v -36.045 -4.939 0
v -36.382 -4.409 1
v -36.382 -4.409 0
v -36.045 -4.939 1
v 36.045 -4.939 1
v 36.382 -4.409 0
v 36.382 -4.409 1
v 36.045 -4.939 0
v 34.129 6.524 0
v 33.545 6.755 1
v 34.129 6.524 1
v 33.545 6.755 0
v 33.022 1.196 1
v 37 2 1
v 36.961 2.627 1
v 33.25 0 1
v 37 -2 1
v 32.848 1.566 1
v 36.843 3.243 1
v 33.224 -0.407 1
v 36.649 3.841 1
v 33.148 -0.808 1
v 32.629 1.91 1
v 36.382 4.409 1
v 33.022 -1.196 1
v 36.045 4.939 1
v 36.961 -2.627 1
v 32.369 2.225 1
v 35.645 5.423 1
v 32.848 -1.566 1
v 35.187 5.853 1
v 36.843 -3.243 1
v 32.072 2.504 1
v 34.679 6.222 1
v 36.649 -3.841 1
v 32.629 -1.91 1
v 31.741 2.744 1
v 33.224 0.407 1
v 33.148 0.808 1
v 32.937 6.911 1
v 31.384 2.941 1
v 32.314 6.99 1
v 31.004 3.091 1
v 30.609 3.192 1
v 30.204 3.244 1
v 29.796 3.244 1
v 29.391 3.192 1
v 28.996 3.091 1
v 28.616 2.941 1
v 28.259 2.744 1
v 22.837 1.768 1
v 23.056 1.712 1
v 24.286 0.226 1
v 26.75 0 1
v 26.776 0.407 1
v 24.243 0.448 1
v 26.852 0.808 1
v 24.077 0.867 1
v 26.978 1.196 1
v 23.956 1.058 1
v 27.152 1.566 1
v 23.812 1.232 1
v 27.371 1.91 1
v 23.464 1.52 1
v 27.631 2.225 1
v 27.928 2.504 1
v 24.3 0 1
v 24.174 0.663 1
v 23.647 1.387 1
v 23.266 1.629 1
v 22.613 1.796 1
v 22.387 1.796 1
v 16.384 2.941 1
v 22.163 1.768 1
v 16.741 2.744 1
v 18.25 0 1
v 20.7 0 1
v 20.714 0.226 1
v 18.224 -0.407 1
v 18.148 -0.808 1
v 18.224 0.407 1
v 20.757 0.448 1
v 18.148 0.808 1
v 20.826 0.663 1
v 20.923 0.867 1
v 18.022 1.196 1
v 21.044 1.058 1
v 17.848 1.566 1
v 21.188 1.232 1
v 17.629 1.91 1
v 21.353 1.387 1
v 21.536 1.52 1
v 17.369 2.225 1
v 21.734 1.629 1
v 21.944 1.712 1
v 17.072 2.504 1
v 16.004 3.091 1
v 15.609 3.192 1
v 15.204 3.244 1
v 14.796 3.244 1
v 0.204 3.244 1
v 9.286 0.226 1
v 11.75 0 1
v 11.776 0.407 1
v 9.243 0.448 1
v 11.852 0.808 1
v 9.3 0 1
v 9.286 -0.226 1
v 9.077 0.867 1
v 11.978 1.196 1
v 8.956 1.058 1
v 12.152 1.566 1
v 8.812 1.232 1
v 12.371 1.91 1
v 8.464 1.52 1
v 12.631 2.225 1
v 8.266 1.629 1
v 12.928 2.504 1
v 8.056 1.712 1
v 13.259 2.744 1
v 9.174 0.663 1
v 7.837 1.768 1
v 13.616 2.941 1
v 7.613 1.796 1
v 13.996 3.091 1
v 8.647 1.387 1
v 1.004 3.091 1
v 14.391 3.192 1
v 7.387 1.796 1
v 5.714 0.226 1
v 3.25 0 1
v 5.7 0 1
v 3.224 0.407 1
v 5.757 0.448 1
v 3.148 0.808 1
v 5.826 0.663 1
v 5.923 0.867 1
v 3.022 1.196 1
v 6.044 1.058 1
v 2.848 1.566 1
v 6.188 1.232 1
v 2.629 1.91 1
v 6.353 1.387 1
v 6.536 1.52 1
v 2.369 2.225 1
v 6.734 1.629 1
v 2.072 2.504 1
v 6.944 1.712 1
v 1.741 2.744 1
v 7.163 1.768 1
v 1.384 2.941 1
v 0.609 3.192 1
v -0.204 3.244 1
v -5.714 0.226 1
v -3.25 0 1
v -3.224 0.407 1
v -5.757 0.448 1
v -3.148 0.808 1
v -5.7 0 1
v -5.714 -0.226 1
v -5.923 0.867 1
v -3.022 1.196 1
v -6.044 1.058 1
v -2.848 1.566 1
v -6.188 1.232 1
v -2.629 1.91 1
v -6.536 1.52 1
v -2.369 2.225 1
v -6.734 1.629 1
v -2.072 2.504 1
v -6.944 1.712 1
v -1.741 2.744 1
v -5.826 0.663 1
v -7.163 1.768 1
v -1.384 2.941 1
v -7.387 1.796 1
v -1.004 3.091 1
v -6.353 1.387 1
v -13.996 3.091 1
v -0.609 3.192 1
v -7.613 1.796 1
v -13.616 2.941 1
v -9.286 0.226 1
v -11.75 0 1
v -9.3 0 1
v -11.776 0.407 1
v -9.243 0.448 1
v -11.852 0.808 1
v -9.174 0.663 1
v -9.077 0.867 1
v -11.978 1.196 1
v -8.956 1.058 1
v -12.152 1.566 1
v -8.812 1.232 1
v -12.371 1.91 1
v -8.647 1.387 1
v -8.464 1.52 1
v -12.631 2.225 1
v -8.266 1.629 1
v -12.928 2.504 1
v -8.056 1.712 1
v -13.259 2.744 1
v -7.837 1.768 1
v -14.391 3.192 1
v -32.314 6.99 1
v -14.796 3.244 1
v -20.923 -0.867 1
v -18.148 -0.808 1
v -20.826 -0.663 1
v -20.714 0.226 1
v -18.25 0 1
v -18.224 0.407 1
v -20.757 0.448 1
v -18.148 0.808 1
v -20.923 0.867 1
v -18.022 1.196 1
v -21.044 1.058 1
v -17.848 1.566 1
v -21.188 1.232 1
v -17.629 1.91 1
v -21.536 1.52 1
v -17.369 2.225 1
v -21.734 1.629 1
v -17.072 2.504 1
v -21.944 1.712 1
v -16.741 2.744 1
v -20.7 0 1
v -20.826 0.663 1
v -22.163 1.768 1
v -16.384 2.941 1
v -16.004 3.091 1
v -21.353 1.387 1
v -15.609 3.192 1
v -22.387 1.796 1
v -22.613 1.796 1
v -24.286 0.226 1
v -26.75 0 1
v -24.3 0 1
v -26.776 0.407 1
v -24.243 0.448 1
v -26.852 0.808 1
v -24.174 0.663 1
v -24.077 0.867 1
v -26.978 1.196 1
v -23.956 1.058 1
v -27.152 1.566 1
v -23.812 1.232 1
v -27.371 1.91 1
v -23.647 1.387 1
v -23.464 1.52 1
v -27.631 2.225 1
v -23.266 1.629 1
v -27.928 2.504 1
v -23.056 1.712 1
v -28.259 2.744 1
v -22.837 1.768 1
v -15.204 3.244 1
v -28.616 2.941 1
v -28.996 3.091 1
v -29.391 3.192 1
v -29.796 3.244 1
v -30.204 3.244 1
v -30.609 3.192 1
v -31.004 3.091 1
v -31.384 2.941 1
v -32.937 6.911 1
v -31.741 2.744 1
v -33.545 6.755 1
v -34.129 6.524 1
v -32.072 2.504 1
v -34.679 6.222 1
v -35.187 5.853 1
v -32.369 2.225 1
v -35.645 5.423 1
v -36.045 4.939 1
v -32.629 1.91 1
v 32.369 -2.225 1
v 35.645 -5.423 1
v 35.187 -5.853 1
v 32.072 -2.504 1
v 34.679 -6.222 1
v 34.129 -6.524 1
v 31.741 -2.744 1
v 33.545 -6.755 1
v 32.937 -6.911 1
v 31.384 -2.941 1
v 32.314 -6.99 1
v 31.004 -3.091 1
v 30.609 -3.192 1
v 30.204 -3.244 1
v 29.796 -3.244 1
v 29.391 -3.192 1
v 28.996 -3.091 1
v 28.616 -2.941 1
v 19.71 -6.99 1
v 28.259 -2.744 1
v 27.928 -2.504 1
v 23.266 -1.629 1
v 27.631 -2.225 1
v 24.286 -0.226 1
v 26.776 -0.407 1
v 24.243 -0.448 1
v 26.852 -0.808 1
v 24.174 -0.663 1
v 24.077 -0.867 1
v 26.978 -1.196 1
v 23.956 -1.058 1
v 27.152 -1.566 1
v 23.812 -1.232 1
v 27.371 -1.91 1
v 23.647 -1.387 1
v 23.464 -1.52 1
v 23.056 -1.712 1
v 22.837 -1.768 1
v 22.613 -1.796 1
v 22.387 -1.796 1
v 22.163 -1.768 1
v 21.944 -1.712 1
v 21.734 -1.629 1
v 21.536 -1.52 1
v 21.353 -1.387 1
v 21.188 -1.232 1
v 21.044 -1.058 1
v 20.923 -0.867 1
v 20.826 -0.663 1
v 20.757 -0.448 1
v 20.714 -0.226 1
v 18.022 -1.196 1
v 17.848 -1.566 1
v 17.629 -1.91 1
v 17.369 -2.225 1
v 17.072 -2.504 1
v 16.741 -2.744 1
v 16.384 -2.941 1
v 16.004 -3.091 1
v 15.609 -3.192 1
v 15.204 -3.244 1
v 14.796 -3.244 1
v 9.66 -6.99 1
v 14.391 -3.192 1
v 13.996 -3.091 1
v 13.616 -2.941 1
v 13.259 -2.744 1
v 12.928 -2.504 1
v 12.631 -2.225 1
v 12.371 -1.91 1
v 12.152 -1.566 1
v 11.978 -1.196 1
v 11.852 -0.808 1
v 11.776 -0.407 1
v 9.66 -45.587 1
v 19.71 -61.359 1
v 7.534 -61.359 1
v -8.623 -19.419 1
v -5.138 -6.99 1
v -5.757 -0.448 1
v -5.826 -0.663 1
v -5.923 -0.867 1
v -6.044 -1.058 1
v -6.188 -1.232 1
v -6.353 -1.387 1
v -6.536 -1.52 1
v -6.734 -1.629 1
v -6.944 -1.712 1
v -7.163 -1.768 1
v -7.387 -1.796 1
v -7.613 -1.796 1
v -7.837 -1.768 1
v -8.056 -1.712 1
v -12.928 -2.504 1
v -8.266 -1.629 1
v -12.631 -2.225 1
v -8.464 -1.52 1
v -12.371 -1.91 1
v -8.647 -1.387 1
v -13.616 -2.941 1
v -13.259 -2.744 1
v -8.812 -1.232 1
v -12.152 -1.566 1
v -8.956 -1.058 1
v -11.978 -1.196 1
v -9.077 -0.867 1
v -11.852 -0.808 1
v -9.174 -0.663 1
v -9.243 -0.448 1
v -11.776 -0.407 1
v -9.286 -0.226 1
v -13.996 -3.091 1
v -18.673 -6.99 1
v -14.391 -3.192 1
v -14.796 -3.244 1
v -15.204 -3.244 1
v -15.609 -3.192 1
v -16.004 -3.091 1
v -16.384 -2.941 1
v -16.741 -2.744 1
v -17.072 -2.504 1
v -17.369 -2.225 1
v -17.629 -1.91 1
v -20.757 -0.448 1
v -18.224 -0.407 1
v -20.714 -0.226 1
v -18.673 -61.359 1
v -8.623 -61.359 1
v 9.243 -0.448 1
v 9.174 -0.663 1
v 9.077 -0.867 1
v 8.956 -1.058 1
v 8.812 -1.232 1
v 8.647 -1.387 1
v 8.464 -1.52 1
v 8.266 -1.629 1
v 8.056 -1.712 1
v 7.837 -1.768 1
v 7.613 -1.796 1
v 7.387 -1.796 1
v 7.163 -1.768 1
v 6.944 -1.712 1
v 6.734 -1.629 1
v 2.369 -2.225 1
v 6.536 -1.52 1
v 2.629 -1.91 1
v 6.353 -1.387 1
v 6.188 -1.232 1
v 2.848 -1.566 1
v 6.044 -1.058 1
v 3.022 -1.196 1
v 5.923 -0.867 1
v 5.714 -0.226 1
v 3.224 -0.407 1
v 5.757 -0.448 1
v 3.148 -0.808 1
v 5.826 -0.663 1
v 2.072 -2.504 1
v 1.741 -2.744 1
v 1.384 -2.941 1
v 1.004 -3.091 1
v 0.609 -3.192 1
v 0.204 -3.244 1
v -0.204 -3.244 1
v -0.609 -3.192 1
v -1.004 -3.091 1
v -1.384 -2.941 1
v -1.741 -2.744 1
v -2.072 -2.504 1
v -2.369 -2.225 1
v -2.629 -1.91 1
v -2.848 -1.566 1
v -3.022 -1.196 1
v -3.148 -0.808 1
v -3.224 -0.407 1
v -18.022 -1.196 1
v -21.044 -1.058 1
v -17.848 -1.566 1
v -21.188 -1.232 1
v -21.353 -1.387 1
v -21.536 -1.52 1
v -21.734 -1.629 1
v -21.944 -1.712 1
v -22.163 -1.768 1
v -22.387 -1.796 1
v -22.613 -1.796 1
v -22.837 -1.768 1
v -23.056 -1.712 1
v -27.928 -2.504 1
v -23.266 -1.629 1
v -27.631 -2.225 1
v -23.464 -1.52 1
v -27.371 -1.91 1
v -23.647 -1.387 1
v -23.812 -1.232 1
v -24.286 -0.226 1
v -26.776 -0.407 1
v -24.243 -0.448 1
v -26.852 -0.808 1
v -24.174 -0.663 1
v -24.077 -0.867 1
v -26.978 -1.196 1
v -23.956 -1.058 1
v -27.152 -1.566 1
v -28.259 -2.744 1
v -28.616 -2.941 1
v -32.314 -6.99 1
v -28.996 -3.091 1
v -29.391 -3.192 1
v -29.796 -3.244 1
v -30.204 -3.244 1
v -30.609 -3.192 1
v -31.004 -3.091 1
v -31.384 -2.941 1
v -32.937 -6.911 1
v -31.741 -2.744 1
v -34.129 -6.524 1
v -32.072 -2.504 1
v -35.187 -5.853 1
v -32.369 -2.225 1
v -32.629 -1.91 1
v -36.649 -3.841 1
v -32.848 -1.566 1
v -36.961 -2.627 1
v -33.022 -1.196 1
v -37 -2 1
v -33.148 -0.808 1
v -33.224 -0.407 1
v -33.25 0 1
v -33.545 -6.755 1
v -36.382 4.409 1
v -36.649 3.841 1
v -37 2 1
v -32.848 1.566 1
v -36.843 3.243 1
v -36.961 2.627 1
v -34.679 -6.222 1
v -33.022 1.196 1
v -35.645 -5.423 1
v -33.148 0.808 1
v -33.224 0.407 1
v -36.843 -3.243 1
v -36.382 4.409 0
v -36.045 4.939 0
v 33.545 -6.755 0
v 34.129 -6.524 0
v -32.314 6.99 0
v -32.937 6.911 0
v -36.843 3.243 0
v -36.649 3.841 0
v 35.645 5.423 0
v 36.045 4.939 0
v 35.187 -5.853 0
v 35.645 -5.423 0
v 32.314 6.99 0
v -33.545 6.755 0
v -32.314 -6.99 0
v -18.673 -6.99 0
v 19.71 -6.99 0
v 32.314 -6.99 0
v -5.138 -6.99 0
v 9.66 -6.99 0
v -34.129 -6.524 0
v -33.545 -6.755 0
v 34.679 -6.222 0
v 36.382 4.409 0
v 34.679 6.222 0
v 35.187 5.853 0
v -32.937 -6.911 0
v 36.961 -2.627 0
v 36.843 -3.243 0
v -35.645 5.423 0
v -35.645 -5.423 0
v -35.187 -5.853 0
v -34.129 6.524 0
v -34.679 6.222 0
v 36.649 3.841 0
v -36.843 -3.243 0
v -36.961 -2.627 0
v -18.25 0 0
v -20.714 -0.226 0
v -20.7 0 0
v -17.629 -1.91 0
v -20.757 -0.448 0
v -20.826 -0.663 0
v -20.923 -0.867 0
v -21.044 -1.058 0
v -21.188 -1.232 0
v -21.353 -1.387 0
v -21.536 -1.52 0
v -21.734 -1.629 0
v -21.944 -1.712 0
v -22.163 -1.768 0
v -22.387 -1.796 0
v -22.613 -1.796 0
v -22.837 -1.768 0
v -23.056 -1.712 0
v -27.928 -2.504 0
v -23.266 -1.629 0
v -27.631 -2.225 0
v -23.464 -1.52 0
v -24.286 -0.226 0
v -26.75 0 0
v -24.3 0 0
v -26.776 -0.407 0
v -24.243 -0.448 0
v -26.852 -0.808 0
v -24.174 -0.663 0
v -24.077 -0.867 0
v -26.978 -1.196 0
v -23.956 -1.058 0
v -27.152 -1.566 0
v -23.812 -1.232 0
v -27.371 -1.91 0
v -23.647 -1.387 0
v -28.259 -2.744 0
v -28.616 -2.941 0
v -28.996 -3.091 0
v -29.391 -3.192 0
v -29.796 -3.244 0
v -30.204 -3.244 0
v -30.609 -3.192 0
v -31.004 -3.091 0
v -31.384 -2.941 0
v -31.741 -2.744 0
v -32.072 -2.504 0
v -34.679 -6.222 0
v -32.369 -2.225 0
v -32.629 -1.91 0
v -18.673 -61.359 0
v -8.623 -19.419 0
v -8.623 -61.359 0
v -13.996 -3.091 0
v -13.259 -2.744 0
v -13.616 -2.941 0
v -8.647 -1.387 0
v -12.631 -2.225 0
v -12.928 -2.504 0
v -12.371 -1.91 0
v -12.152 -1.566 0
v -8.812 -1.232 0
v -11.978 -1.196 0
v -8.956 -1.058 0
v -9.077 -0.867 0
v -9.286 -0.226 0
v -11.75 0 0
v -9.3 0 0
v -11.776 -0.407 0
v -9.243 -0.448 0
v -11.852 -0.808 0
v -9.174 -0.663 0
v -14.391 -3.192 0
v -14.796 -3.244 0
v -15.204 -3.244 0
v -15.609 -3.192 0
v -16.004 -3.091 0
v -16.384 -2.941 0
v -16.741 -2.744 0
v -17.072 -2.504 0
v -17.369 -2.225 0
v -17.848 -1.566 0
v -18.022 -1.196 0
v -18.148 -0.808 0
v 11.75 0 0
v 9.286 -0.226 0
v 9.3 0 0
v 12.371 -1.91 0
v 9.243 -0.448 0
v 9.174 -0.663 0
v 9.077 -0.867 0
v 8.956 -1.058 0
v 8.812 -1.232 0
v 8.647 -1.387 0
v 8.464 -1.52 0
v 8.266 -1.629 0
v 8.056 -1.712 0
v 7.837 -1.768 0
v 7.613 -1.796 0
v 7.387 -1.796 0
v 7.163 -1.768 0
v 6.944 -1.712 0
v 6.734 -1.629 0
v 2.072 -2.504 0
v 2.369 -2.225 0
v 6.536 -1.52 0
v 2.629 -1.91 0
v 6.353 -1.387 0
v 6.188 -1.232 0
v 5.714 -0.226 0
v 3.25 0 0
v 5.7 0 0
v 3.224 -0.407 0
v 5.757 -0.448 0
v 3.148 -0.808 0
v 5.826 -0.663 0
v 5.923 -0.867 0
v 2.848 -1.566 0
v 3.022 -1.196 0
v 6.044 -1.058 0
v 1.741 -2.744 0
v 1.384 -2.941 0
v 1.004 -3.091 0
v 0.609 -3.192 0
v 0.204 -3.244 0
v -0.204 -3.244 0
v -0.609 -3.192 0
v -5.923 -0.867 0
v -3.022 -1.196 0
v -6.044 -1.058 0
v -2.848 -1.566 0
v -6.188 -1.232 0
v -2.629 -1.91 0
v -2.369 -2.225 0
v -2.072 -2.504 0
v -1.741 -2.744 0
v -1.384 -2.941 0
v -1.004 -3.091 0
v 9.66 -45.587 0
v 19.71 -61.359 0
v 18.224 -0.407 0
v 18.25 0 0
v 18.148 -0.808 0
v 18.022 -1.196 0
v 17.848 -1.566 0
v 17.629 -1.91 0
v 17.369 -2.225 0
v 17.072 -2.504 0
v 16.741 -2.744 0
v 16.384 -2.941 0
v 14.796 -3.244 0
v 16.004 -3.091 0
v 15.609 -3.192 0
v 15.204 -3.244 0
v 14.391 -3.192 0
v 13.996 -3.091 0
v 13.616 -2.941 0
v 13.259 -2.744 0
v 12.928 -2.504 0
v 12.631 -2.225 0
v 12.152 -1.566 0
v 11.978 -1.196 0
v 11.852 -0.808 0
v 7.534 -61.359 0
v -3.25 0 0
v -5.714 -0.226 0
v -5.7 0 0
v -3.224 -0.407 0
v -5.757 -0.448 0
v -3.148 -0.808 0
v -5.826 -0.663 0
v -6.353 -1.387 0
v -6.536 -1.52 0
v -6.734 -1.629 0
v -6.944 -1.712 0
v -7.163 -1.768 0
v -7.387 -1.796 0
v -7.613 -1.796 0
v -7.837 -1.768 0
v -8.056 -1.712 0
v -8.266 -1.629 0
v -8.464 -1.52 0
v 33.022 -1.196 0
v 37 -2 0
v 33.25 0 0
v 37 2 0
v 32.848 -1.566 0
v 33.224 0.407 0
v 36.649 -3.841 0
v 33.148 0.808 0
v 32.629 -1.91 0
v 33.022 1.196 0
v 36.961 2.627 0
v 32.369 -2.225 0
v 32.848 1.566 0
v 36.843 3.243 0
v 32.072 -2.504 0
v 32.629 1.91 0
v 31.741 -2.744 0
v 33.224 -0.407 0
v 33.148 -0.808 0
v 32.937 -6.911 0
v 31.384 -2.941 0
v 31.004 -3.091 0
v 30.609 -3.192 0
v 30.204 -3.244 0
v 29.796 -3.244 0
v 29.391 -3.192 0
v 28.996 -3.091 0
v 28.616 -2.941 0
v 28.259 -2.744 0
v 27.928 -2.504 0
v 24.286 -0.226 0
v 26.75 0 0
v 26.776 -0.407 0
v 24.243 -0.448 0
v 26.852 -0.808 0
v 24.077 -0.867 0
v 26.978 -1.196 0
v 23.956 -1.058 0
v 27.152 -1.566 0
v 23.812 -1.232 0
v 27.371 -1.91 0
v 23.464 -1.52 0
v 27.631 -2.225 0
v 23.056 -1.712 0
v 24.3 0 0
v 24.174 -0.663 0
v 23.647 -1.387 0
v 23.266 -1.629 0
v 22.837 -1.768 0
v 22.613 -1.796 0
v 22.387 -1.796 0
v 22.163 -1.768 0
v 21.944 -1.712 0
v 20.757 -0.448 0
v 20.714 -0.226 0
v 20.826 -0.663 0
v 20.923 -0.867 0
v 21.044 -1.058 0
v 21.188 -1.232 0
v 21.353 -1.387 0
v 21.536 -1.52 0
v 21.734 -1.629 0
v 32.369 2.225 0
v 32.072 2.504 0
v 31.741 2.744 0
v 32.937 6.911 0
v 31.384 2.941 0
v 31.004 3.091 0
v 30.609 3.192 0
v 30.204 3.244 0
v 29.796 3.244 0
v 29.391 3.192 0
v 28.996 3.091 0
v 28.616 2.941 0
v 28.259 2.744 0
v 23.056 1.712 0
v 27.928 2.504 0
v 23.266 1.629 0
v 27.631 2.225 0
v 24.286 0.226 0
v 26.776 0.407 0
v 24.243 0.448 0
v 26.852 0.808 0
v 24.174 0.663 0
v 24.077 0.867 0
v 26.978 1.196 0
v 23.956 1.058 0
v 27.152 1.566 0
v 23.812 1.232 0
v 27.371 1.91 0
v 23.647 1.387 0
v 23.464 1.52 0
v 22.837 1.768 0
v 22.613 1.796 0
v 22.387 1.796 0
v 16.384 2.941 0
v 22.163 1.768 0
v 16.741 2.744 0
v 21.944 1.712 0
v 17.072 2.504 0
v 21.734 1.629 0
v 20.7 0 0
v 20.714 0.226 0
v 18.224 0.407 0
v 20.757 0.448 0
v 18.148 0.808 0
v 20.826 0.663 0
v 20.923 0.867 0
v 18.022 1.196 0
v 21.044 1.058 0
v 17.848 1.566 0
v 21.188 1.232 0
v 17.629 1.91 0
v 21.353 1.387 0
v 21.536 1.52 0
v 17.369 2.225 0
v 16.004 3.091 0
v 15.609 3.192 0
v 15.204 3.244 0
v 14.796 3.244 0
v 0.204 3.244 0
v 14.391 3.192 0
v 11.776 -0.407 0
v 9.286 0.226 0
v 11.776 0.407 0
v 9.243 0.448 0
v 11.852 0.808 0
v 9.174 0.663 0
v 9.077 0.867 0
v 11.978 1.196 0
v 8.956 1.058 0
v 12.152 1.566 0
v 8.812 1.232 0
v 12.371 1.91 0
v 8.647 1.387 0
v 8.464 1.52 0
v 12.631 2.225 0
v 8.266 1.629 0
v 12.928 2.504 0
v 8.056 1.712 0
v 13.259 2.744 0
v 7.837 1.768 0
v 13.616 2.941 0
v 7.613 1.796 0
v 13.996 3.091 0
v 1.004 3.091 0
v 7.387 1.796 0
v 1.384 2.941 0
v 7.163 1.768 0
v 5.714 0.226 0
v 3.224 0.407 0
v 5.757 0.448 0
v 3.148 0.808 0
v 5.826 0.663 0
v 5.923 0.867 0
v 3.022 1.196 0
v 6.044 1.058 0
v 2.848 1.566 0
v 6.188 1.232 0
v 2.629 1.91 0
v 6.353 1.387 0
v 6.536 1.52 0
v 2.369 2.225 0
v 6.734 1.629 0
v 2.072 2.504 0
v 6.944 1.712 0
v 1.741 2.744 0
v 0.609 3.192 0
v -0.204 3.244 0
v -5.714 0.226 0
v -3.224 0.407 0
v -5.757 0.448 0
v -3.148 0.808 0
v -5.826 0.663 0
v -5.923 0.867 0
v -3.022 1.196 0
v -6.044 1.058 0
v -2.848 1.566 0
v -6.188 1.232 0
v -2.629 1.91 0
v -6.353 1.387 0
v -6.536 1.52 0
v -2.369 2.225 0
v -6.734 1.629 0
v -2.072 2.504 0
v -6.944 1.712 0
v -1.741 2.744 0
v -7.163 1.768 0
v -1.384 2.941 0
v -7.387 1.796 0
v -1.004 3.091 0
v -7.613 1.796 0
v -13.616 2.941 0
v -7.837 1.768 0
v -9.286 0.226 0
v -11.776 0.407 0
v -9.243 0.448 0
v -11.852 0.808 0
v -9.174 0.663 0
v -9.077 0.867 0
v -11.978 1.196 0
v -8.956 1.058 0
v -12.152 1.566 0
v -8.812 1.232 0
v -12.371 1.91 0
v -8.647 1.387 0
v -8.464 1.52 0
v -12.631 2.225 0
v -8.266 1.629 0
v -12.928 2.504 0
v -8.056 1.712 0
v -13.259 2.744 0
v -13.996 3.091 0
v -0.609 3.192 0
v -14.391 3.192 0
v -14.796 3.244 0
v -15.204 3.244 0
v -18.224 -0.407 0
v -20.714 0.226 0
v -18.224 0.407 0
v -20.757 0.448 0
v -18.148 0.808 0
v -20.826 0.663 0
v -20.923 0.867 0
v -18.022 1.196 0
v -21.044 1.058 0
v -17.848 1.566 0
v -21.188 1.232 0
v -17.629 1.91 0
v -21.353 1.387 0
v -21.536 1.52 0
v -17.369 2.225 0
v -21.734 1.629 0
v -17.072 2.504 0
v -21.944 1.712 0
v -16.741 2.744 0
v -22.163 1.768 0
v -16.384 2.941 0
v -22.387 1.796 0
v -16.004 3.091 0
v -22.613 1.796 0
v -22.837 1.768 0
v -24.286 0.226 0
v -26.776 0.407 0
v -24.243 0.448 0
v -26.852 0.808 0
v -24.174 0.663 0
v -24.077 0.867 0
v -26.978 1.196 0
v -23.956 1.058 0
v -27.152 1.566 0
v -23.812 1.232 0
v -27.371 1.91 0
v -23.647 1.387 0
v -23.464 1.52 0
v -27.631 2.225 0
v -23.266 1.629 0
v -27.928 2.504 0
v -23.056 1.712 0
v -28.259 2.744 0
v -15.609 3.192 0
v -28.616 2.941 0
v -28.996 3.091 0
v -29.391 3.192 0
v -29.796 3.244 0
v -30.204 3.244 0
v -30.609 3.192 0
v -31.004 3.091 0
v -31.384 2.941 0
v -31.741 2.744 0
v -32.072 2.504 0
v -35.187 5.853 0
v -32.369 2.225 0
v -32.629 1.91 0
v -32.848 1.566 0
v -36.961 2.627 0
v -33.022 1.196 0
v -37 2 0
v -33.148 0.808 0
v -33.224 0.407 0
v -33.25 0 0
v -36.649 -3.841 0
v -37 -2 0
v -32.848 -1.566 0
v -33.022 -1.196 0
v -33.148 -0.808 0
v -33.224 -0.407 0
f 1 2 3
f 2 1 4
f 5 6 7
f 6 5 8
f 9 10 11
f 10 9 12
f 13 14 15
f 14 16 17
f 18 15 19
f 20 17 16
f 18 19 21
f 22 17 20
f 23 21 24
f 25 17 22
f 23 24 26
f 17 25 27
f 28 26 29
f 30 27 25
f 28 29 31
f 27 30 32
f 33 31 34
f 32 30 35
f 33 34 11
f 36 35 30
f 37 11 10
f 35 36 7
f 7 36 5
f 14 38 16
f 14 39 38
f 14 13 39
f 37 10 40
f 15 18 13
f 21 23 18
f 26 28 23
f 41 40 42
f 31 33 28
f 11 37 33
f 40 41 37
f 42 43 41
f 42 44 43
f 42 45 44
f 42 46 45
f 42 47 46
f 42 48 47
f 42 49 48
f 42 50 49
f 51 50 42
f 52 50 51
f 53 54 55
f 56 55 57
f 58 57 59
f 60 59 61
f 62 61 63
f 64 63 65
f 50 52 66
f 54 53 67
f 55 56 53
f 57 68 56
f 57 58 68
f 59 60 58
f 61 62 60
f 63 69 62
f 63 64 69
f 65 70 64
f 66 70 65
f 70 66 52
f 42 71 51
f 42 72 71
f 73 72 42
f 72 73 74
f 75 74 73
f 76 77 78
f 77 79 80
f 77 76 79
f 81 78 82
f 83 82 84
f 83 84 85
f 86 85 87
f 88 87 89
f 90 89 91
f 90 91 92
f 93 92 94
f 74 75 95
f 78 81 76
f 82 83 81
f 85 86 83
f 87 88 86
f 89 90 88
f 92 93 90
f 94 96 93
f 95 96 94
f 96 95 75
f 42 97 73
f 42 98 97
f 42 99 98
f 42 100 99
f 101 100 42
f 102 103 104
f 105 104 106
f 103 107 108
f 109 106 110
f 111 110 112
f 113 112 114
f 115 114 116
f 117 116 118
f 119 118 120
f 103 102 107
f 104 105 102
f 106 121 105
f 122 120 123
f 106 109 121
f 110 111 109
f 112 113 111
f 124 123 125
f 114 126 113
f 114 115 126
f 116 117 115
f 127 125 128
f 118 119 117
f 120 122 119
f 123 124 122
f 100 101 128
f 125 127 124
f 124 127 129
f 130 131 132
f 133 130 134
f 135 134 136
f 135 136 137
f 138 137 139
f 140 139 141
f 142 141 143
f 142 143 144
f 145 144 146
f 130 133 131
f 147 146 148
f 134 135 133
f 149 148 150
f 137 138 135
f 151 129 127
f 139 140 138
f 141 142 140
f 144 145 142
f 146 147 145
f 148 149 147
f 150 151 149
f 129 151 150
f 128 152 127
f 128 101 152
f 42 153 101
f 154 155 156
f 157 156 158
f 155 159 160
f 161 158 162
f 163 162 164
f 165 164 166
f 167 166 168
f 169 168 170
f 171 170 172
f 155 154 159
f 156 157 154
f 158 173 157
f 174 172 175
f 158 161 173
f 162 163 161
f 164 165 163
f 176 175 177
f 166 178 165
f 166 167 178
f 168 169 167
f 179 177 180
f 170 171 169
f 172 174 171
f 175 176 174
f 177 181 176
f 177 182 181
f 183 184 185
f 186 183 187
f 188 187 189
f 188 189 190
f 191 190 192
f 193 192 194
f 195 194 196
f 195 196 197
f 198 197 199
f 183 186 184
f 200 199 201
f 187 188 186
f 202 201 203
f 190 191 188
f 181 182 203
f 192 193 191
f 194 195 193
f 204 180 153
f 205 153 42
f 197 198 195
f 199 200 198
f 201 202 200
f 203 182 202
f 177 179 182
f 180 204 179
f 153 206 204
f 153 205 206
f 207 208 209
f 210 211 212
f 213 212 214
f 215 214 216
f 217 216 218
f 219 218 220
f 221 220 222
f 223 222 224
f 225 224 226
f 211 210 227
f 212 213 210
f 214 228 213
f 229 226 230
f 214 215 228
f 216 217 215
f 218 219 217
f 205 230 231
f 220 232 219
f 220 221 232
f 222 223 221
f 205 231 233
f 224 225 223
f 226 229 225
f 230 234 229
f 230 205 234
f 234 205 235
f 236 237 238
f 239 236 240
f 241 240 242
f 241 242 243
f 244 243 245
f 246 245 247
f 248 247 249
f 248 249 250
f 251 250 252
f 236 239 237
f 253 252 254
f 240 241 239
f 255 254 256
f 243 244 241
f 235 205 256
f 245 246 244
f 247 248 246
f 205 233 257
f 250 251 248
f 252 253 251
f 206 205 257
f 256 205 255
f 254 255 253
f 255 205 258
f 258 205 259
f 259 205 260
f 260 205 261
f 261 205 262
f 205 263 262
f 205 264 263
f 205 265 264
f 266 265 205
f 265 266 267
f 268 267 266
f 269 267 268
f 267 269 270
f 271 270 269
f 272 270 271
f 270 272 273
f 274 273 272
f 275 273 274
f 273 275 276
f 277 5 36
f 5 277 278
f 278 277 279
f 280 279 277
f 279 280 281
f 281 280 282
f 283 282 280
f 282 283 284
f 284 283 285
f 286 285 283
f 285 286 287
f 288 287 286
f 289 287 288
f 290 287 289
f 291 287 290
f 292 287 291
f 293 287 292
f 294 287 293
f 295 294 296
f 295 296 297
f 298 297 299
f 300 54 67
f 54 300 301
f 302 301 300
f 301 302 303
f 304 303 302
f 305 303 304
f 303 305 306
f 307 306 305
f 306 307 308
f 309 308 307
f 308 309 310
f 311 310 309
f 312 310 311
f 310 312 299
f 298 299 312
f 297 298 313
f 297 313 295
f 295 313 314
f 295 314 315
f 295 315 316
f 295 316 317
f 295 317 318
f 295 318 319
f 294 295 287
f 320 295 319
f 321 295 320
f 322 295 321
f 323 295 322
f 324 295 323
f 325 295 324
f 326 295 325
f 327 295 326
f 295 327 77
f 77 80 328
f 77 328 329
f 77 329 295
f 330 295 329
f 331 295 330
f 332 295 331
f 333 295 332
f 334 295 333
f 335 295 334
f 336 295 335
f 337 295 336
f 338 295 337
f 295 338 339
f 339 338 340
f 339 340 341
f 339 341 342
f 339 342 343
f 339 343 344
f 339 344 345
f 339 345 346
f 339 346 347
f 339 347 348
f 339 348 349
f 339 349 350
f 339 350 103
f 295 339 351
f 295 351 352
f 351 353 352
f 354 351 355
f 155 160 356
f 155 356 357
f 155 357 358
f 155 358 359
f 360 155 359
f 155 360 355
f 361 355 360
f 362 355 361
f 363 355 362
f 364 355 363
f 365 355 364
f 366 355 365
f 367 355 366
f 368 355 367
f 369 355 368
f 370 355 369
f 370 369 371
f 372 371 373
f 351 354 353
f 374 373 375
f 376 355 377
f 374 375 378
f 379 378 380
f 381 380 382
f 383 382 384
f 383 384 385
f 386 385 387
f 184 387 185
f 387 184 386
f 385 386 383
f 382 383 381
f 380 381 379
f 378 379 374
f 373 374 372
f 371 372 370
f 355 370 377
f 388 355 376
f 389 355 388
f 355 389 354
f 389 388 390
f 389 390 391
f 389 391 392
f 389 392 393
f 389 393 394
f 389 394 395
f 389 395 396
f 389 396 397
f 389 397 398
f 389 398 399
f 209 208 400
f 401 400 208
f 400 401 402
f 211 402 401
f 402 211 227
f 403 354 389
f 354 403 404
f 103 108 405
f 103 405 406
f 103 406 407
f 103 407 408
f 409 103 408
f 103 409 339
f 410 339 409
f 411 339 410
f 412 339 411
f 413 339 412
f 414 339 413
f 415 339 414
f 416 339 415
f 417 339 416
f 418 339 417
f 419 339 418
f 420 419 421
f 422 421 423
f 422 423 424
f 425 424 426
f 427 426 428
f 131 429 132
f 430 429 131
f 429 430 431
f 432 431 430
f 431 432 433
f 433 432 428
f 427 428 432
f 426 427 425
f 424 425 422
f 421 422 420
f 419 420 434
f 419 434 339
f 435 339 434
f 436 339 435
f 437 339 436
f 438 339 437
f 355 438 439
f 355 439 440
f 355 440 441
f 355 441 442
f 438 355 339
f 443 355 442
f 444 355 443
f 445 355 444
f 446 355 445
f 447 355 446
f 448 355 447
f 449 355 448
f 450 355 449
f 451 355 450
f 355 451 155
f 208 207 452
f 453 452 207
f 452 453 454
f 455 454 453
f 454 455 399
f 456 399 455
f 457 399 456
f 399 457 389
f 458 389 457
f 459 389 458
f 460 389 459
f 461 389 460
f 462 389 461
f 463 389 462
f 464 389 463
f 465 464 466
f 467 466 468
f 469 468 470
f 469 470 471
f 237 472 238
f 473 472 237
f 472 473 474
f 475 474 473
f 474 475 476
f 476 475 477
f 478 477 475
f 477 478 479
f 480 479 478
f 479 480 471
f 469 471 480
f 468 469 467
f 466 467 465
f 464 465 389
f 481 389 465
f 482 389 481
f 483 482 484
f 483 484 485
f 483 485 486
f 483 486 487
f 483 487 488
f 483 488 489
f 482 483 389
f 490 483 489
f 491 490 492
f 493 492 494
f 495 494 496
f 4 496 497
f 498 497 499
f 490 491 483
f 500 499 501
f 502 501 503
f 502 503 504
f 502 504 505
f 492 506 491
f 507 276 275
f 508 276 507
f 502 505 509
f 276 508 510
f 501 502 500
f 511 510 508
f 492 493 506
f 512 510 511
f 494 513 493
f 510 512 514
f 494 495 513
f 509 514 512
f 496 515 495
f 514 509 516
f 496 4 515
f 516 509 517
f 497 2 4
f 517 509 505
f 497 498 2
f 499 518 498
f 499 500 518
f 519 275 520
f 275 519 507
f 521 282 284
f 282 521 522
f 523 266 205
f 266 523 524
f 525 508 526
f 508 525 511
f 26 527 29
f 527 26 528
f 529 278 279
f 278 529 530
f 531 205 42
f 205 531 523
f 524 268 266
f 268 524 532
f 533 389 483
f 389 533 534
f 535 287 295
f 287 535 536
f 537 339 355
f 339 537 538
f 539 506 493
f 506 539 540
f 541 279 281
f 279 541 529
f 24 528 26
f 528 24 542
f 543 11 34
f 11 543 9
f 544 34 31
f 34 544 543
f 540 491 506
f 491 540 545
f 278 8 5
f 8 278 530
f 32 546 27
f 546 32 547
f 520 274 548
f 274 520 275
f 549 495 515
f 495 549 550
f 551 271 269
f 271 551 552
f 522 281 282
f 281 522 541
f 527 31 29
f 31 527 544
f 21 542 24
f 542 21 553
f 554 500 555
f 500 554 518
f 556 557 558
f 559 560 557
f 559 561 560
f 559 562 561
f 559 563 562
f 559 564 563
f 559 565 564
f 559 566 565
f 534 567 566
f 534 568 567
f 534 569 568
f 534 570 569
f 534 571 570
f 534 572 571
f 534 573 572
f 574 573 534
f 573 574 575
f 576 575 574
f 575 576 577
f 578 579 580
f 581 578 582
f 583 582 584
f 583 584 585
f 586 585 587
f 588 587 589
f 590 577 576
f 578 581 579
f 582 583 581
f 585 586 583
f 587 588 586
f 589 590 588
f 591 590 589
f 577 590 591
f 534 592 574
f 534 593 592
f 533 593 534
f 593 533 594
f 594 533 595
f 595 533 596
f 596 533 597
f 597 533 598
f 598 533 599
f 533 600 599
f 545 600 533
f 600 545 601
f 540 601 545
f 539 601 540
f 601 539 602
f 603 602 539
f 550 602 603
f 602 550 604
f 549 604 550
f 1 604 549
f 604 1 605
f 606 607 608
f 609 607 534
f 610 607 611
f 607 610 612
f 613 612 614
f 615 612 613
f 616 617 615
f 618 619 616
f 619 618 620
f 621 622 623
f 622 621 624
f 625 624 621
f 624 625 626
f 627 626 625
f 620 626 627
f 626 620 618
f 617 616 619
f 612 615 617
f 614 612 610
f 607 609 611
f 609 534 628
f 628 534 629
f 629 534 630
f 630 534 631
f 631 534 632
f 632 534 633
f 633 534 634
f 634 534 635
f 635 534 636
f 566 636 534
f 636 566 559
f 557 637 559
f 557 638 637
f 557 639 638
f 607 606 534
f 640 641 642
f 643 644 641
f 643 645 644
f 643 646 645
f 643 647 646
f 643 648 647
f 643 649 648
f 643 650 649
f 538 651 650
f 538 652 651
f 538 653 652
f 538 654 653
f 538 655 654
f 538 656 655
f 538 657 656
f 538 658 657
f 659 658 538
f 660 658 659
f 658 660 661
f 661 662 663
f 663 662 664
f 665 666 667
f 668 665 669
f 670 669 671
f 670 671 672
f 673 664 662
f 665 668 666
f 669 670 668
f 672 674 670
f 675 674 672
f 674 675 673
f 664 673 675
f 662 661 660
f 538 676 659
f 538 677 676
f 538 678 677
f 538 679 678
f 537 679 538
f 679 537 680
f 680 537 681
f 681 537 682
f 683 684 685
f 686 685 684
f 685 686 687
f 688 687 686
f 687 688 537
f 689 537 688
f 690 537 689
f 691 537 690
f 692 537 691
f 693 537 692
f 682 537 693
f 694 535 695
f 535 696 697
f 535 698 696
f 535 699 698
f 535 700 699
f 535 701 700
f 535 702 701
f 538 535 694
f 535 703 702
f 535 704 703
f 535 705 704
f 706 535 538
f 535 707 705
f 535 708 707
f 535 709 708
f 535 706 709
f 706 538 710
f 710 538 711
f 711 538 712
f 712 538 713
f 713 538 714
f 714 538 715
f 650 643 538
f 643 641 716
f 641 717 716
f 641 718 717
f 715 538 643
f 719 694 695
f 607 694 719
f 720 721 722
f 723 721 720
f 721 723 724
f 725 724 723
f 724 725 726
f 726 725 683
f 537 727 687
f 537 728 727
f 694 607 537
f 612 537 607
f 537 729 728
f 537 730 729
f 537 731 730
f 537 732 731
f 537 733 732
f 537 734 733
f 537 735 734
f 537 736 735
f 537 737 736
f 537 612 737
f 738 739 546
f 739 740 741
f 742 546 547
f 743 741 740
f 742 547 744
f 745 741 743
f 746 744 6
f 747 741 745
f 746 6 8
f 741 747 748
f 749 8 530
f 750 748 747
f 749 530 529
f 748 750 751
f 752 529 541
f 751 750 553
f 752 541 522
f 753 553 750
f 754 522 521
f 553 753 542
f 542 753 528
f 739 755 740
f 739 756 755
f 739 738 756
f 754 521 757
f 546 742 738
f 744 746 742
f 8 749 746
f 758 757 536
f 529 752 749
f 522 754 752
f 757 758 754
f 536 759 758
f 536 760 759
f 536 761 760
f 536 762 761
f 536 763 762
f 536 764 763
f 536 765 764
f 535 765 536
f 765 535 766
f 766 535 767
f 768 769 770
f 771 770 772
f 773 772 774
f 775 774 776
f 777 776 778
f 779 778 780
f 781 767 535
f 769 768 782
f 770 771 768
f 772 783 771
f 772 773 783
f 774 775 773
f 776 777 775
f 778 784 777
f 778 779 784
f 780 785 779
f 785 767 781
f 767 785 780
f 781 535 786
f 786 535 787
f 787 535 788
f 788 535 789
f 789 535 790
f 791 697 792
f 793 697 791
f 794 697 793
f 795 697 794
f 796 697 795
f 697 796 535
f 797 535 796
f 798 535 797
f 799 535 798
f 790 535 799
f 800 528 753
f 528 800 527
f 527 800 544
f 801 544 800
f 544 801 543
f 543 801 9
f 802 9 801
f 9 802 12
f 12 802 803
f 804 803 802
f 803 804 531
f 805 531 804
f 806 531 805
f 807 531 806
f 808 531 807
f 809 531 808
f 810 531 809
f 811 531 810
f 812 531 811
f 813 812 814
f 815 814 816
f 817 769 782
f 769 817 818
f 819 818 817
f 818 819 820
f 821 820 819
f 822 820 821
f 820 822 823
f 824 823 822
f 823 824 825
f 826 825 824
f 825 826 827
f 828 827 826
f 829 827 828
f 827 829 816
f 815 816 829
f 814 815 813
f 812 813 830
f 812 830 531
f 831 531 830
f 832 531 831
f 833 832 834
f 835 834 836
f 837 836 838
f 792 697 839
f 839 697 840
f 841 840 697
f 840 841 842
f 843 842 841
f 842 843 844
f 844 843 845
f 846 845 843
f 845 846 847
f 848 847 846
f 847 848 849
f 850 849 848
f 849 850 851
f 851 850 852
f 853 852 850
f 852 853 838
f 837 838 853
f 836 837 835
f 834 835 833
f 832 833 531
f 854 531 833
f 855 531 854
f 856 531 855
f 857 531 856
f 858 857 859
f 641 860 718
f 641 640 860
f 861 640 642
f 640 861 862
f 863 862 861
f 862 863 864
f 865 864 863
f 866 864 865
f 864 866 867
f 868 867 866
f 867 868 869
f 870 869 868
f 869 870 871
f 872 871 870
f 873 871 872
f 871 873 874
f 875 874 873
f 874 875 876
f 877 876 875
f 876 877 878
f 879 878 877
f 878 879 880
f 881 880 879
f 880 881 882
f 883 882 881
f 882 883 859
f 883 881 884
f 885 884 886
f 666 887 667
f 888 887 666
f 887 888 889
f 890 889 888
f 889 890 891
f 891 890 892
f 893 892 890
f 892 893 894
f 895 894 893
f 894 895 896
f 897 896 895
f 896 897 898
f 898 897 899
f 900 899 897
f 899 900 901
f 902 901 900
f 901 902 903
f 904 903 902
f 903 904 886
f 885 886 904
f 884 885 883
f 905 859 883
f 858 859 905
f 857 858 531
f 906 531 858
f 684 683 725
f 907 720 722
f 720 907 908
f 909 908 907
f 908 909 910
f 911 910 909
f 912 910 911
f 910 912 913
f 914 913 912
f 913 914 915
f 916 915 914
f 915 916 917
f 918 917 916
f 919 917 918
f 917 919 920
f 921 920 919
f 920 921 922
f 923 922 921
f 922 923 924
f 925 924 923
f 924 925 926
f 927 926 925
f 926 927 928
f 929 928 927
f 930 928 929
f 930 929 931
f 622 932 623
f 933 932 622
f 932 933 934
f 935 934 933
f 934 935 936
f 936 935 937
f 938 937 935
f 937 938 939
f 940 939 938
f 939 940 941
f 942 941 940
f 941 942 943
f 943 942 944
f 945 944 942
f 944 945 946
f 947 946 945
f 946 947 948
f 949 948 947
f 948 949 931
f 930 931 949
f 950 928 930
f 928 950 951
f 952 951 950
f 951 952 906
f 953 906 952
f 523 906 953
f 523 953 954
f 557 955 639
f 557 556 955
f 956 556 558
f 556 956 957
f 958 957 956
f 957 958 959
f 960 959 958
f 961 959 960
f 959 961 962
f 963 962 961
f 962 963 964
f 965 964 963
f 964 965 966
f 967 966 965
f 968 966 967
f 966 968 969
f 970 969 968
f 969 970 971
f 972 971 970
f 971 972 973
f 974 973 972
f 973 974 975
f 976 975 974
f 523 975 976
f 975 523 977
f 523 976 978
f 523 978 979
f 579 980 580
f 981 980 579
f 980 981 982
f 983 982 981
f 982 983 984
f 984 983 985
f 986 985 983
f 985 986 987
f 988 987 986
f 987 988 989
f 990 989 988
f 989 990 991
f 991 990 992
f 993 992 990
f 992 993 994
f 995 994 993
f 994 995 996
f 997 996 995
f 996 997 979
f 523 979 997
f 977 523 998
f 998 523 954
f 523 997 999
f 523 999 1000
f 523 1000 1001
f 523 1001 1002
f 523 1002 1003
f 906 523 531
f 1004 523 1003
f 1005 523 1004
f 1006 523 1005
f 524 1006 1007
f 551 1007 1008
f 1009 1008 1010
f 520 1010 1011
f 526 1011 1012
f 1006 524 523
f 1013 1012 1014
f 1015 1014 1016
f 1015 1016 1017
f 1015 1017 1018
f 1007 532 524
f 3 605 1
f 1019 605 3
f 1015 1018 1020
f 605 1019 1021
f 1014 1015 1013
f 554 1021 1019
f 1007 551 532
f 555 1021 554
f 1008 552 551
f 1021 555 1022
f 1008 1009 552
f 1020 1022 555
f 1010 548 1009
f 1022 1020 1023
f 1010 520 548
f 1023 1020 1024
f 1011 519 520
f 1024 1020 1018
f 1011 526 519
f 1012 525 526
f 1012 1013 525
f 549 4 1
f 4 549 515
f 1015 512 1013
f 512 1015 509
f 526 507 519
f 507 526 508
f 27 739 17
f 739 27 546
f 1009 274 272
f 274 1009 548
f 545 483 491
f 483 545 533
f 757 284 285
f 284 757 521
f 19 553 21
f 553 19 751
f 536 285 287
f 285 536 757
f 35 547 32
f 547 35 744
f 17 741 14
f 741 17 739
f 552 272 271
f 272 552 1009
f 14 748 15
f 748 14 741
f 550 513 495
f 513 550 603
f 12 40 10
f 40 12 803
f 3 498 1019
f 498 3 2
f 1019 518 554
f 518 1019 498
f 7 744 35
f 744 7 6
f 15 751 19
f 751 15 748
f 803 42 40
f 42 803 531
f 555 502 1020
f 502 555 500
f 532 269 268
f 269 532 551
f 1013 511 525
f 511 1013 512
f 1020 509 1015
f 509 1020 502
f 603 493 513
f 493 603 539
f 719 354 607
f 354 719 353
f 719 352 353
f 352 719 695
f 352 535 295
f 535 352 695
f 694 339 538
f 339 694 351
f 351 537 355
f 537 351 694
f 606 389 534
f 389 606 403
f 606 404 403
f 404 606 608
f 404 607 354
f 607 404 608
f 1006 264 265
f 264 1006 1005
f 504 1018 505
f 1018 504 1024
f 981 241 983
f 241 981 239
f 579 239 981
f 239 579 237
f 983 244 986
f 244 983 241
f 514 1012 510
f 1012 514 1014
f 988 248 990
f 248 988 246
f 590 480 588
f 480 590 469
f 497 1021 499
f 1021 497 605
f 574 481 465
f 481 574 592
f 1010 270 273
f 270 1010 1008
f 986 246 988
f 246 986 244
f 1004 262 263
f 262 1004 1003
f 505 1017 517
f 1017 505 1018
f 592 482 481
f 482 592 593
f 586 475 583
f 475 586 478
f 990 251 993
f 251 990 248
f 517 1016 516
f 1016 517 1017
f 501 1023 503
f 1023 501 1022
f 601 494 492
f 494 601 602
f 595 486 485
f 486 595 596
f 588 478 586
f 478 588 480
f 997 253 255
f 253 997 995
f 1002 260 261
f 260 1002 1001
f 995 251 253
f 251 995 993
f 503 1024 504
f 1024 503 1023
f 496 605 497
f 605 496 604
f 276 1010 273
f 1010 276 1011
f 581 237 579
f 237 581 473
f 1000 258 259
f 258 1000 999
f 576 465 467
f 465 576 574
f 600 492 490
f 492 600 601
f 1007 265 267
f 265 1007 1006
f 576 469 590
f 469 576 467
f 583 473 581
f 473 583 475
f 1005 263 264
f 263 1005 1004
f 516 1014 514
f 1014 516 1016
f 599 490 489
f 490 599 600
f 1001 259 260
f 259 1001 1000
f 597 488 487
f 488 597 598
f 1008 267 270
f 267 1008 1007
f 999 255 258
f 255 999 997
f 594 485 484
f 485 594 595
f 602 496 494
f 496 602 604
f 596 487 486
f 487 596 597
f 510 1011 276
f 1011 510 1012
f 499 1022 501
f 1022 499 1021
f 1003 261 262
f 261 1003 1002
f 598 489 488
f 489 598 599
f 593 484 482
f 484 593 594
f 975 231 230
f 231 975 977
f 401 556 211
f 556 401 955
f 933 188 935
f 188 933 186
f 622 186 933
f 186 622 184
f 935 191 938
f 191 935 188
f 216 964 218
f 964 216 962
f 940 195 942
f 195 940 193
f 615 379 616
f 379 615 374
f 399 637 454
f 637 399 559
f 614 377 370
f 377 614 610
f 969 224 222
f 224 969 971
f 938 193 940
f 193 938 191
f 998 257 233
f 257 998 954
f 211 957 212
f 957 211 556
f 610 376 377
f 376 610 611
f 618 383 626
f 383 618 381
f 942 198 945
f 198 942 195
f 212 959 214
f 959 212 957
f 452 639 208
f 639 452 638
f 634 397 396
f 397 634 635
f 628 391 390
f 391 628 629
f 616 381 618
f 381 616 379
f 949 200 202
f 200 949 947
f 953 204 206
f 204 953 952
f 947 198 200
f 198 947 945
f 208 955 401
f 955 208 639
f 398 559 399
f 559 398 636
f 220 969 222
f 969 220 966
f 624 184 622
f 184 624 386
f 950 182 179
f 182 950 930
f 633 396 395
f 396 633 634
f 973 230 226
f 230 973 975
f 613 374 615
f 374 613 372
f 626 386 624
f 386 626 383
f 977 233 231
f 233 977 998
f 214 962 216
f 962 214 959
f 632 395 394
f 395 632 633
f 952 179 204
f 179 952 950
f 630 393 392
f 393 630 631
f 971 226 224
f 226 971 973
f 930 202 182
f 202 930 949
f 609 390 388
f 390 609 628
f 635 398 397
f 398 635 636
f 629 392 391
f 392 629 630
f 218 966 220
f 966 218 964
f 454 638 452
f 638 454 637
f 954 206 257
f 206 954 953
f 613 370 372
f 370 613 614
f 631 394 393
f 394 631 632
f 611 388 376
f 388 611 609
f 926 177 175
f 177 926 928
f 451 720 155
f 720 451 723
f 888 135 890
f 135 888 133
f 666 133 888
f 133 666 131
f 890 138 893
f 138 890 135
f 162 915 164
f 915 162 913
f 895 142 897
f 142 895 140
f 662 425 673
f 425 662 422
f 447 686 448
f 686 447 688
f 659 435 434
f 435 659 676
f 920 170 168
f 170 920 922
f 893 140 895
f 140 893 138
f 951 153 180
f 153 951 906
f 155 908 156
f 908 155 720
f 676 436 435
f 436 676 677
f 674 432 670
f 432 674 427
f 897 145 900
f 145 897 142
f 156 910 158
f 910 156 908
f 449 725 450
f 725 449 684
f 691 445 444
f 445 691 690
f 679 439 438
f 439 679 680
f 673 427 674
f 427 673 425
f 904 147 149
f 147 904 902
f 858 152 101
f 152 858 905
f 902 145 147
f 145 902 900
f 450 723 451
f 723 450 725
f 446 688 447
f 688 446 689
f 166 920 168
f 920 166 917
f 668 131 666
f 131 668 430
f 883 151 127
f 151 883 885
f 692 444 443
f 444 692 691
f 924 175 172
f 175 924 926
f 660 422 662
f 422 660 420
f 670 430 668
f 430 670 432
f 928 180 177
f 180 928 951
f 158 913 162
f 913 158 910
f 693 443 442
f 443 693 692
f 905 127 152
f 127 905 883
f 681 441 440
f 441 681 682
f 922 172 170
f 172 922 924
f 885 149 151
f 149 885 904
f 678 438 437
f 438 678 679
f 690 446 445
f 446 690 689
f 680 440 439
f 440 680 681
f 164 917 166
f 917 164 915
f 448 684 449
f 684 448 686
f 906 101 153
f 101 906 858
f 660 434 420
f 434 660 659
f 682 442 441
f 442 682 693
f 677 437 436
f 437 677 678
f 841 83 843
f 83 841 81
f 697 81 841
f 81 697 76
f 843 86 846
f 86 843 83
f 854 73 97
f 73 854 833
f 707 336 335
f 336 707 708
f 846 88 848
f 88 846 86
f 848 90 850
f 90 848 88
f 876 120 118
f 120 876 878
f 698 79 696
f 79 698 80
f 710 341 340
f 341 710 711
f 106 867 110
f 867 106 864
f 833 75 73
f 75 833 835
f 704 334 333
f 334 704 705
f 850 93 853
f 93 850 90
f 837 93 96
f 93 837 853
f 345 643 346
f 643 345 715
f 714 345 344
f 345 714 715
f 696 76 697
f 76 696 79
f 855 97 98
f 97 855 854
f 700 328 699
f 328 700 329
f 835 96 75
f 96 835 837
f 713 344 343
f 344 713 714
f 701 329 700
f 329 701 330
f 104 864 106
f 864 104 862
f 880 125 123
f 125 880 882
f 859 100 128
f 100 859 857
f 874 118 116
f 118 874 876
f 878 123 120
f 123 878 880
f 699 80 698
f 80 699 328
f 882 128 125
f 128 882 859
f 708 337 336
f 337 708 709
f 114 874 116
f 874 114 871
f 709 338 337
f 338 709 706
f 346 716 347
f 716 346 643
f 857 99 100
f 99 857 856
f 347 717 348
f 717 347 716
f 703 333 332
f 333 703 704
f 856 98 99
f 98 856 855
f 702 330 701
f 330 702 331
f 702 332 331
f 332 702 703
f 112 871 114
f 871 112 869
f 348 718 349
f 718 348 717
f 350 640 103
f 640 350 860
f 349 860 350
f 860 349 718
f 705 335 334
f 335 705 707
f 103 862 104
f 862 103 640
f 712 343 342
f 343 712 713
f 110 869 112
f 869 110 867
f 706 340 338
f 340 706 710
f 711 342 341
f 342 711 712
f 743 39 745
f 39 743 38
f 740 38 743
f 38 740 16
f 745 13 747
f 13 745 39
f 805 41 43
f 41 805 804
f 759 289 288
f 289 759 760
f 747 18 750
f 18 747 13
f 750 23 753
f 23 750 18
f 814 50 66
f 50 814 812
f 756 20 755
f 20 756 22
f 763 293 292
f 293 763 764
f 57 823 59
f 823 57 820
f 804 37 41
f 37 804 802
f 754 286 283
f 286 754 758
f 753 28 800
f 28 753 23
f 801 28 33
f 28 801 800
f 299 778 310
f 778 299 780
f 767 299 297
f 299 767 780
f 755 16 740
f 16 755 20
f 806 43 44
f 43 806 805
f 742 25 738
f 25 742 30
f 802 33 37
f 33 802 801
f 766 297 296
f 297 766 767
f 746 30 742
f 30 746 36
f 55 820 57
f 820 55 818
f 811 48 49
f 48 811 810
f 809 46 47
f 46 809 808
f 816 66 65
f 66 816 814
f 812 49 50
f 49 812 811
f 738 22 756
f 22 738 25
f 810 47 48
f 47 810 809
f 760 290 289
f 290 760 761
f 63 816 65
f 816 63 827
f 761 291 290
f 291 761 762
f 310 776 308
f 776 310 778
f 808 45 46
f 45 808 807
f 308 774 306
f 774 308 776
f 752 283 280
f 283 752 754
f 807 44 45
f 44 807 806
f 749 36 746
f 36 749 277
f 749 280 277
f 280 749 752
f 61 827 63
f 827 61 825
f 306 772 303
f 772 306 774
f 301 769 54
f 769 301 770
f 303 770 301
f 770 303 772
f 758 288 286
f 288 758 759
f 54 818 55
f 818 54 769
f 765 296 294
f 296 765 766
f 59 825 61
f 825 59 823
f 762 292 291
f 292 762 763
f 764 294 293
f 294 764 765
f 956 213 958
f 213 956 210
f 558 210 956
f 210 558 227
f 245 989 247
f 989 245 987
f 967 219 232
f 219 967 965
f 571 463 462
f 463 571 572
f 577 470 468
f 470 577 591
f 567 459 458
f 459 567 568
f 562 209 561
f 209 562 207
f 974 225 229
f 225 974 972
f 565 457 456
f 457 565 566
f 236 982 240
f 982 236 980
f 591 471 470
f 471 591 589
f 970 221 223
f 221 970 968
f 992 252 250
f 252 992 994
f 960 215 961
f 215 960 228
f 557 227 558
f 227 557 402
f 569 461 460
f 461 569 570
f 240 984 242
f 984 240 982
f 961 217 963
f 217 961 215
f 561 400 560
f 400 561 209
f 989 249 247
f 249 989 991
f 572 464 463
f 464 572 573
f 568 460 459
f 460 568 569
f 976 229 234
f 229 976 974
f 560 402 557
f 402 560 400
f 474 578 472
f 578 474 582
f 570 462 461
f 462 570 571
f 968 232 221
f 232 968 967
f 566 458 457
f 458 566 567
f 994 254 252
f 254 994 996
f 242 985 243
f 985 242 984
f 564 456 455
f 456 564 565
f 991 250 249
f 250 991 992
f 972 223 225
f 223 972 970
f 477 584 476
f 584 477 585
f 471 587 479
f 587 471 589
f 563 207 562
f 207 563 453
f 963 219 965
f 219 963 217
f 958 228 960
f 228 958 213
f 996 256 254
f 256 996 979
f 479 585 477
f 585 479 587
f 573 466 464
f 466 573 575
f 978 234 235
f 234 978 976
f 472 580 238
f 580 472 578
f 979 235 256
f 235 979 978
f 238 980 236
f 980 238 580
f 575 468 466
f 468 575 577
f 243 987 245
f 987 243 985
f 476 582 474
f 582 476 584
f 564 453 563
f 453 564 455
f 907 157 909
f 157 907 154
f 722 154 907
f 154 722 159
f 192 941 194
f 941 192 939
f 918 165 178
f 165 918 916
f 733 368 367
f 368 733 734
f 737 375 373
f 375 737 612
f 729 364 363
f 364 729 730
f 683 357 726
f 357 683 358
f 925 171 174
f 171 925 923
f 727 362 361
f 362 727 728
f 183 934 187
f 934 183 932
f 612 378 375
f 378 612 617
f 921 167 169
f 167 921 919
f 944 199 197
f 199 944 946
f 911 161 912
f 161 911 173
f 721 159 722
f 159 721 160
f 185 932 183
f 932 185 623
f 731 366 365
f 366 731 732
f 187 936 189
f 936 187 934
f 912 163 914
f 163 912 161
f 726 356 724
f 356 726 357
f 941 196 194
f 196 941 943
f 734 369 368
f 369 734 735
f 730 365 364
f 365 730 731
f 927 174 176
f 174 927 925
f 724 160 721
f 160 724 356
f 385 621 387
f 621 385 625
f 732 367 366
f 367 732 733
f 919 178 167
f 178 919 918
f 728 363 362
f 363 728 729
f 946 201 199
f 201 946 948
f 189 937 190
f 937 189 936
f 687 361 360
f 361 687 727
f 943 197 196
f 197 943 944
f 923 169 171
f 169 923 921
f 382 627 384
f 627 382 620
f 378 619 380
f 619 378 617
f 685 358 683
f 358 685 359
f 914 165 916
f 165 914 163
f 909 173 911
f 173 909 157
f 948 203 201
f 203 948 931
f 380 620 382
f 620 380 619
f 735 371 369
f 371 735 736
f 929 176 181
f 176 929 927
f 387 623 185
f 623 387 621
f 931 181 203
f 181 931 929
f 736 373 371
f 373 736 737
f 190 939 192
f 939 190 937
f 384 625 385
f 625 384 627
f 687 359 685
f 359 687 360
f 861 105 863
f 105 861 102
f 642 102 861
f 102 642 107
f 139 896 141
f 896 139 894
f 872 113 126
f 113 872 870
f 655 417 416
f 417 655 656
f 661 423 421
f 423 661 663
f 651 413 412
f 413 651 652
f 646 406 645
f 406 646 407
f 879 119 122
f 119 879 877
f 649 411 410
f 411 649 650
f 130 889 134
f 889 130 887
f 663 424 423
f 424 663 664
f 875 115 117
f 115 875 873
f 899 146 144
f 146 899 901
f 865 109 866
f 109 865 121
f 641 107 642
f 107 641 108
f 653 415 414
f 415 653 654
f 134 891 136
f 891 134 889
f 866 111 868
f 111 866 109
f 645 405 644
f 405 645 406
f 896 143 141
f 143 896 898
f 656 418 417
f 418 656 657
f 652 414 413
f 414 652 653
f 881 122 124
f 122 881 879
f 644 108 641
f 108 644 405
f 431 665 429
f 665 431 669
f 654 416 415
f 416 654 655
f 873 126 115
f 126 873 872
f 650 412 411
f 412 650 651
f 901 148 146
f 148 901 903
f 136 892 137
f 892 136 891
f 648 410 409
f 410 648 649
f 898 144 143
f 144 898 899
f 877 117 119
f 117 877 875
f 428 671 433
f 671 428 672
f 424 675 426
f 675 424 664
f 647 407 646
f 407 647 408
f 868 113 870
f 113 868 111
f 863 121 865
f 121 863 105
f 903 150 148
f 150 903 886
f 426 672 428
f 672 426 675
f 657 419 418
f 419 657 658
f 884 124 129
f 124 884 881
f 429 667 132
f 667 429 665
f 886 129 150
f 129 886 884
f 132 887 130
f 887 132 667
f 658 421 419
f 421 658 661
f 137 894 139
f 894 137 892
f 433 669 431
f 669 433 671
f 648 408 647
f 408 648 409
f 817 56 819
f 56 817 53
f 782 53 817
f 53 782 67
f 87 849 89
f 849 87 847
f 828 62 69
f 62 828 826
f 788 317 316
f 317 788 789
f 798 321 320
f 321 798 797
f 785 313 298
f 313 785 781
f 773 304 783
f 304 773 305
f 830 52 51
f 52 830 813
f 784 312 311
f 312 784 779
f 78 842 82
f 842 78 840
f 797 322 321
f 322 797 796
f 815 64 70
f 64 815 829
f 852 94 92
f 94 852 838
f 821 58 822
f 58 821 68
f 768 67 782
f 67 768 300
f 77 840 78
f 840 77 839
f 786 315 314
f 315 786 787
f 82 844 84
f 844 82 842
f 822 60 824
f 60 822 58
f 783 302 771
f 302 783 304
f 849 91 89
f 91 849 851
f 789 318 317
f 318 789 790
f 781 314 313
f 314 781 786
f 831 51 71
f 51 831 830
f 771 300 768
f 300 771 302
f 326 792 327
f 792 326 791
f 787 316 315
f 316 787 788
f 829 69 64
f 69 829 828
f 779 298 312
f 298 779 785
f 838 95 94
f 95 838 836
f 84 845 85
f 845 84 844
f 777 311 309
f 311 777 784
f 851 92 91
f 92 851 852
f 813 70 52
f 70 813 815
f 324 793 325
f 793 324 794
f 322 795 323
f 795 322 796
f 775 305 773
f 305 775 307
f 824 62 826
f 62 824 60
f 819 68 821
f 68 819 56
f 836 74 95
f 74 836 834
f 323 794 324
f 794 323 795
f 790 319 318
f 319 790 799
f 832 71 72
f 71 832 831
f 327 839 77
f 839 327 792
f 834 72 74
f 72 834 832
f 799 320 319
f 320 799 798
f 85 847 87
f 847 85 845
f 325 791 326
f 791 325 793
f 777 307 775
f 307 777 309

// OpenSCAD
$fn = 50;


difference() {
	union() {
		hull() {
			translate(v = [-32.0000000000, 2.0000000000, 0]) {
				cylinder(h = 1, r = 5);
			}
			translate(v = [32.0000000000, 2.0000000000, 0]) {
				cylinder(h = 1, r = 5);
			}
			translate(v = [-32.0000000000, -2.0000000000, 0]) {
				cylinder(h = 1, r = 5);
			}
			translate(v = [32.0000000000, -2.0000000000, 0]) {
				cylinder(h = 1, r = 5);
			}
		}
		translate(v = [0, -5, 0]) {
			linear_extrude(height = 1) {
				text(font = "DejaVu Sans Mono:style=Bold", halign = "center", size = 57.0000000000, text = "N", valign = "top");
			}
		}
	}
	union() {
		translate(v = [-30.0000000000, 0.0000000000, 0]) {
			translate(v = [0, 0, -100]) {
				cylinder(h = 200, r = 3.2500000000);
			}
		}
		translate(v = [-15.0000000000, 0.0000000000, 0]) {
			translate(v = [0, 0, -100]) {
				cylinder(h = 200, r = 3.2500000000);
			}
		}
		translate(v = [0, 0, -100]) {
			cylinder(h = 200, r = 3.2500000000);
		}
		translate(v = [15.0000000000, 0.0000000000, 0]) {
			translate(v = [0, 0, -100]) {
				cylinder(h = 200, r = 3.2500000000);
			}
		}
		translate(v = [30.0000000000, 0.0000000000, 0]) {
			translate(v = [0, 0, -100]) {
				cylinder(h = 200, r = 3.2500000000);
			}
		}
		translate(v = [-30.0000000000, 0.0000000000, 0]) {
			translate(v = [0, 0, -100]) {
				cylinder(h = 200, r = 1.8000000000);
			}
		}
		translate(v = [-22.5000000000, 0.0000000000, 0]) {
			translate(v = [0, 0, -100]) {
				cylinder(h = 200, r = 1.8000000000);
			}
		}
		translate(v = [-15.0000000000, 0.0000000000, 0]) {
			translate(v = [0, 0, -100]) {
				cylinder(h = 200, r = 1.8000000000);
			}
		}
		translate(v = [-7.5000000000, 0.0000000000, 0]) {
			translate(v = [0, 0, -100]) {
				cylinder(h = 200, r = 1.8000000000);
			}
		}
		translate(v = [0, 0, -100]) {
			cylinder(h = 200, r = 1.8000000000);
		}
		translate(v = [7.5000000000, 0.0000000000, 0]) {
			translate(v = [0, 0, -100]) {
				cylinder(h = 200, r = 1.8000000000);
			}
		}
		translate(v = [15.0000000000, 0.0000000000, 0]) {
			translate(v = [0, 0, -100]) {
				cylinder(h = 200, r = 1.8000000000);
			}
		}
		translate(v = [22.5000000000, 0.0000000000, 0]) {
			translate(v = [0, 0, -100]) {
				cylinder(h = 200, r = 1.8000000000);
			}
		}
		translate(v = [30.0000000000, 0.0000000000, 0]) {
			translate(v = [0, 0, -100]) {
				cylinder(h = 200, r = 1.8000000000);
			}
		}
	}
}
